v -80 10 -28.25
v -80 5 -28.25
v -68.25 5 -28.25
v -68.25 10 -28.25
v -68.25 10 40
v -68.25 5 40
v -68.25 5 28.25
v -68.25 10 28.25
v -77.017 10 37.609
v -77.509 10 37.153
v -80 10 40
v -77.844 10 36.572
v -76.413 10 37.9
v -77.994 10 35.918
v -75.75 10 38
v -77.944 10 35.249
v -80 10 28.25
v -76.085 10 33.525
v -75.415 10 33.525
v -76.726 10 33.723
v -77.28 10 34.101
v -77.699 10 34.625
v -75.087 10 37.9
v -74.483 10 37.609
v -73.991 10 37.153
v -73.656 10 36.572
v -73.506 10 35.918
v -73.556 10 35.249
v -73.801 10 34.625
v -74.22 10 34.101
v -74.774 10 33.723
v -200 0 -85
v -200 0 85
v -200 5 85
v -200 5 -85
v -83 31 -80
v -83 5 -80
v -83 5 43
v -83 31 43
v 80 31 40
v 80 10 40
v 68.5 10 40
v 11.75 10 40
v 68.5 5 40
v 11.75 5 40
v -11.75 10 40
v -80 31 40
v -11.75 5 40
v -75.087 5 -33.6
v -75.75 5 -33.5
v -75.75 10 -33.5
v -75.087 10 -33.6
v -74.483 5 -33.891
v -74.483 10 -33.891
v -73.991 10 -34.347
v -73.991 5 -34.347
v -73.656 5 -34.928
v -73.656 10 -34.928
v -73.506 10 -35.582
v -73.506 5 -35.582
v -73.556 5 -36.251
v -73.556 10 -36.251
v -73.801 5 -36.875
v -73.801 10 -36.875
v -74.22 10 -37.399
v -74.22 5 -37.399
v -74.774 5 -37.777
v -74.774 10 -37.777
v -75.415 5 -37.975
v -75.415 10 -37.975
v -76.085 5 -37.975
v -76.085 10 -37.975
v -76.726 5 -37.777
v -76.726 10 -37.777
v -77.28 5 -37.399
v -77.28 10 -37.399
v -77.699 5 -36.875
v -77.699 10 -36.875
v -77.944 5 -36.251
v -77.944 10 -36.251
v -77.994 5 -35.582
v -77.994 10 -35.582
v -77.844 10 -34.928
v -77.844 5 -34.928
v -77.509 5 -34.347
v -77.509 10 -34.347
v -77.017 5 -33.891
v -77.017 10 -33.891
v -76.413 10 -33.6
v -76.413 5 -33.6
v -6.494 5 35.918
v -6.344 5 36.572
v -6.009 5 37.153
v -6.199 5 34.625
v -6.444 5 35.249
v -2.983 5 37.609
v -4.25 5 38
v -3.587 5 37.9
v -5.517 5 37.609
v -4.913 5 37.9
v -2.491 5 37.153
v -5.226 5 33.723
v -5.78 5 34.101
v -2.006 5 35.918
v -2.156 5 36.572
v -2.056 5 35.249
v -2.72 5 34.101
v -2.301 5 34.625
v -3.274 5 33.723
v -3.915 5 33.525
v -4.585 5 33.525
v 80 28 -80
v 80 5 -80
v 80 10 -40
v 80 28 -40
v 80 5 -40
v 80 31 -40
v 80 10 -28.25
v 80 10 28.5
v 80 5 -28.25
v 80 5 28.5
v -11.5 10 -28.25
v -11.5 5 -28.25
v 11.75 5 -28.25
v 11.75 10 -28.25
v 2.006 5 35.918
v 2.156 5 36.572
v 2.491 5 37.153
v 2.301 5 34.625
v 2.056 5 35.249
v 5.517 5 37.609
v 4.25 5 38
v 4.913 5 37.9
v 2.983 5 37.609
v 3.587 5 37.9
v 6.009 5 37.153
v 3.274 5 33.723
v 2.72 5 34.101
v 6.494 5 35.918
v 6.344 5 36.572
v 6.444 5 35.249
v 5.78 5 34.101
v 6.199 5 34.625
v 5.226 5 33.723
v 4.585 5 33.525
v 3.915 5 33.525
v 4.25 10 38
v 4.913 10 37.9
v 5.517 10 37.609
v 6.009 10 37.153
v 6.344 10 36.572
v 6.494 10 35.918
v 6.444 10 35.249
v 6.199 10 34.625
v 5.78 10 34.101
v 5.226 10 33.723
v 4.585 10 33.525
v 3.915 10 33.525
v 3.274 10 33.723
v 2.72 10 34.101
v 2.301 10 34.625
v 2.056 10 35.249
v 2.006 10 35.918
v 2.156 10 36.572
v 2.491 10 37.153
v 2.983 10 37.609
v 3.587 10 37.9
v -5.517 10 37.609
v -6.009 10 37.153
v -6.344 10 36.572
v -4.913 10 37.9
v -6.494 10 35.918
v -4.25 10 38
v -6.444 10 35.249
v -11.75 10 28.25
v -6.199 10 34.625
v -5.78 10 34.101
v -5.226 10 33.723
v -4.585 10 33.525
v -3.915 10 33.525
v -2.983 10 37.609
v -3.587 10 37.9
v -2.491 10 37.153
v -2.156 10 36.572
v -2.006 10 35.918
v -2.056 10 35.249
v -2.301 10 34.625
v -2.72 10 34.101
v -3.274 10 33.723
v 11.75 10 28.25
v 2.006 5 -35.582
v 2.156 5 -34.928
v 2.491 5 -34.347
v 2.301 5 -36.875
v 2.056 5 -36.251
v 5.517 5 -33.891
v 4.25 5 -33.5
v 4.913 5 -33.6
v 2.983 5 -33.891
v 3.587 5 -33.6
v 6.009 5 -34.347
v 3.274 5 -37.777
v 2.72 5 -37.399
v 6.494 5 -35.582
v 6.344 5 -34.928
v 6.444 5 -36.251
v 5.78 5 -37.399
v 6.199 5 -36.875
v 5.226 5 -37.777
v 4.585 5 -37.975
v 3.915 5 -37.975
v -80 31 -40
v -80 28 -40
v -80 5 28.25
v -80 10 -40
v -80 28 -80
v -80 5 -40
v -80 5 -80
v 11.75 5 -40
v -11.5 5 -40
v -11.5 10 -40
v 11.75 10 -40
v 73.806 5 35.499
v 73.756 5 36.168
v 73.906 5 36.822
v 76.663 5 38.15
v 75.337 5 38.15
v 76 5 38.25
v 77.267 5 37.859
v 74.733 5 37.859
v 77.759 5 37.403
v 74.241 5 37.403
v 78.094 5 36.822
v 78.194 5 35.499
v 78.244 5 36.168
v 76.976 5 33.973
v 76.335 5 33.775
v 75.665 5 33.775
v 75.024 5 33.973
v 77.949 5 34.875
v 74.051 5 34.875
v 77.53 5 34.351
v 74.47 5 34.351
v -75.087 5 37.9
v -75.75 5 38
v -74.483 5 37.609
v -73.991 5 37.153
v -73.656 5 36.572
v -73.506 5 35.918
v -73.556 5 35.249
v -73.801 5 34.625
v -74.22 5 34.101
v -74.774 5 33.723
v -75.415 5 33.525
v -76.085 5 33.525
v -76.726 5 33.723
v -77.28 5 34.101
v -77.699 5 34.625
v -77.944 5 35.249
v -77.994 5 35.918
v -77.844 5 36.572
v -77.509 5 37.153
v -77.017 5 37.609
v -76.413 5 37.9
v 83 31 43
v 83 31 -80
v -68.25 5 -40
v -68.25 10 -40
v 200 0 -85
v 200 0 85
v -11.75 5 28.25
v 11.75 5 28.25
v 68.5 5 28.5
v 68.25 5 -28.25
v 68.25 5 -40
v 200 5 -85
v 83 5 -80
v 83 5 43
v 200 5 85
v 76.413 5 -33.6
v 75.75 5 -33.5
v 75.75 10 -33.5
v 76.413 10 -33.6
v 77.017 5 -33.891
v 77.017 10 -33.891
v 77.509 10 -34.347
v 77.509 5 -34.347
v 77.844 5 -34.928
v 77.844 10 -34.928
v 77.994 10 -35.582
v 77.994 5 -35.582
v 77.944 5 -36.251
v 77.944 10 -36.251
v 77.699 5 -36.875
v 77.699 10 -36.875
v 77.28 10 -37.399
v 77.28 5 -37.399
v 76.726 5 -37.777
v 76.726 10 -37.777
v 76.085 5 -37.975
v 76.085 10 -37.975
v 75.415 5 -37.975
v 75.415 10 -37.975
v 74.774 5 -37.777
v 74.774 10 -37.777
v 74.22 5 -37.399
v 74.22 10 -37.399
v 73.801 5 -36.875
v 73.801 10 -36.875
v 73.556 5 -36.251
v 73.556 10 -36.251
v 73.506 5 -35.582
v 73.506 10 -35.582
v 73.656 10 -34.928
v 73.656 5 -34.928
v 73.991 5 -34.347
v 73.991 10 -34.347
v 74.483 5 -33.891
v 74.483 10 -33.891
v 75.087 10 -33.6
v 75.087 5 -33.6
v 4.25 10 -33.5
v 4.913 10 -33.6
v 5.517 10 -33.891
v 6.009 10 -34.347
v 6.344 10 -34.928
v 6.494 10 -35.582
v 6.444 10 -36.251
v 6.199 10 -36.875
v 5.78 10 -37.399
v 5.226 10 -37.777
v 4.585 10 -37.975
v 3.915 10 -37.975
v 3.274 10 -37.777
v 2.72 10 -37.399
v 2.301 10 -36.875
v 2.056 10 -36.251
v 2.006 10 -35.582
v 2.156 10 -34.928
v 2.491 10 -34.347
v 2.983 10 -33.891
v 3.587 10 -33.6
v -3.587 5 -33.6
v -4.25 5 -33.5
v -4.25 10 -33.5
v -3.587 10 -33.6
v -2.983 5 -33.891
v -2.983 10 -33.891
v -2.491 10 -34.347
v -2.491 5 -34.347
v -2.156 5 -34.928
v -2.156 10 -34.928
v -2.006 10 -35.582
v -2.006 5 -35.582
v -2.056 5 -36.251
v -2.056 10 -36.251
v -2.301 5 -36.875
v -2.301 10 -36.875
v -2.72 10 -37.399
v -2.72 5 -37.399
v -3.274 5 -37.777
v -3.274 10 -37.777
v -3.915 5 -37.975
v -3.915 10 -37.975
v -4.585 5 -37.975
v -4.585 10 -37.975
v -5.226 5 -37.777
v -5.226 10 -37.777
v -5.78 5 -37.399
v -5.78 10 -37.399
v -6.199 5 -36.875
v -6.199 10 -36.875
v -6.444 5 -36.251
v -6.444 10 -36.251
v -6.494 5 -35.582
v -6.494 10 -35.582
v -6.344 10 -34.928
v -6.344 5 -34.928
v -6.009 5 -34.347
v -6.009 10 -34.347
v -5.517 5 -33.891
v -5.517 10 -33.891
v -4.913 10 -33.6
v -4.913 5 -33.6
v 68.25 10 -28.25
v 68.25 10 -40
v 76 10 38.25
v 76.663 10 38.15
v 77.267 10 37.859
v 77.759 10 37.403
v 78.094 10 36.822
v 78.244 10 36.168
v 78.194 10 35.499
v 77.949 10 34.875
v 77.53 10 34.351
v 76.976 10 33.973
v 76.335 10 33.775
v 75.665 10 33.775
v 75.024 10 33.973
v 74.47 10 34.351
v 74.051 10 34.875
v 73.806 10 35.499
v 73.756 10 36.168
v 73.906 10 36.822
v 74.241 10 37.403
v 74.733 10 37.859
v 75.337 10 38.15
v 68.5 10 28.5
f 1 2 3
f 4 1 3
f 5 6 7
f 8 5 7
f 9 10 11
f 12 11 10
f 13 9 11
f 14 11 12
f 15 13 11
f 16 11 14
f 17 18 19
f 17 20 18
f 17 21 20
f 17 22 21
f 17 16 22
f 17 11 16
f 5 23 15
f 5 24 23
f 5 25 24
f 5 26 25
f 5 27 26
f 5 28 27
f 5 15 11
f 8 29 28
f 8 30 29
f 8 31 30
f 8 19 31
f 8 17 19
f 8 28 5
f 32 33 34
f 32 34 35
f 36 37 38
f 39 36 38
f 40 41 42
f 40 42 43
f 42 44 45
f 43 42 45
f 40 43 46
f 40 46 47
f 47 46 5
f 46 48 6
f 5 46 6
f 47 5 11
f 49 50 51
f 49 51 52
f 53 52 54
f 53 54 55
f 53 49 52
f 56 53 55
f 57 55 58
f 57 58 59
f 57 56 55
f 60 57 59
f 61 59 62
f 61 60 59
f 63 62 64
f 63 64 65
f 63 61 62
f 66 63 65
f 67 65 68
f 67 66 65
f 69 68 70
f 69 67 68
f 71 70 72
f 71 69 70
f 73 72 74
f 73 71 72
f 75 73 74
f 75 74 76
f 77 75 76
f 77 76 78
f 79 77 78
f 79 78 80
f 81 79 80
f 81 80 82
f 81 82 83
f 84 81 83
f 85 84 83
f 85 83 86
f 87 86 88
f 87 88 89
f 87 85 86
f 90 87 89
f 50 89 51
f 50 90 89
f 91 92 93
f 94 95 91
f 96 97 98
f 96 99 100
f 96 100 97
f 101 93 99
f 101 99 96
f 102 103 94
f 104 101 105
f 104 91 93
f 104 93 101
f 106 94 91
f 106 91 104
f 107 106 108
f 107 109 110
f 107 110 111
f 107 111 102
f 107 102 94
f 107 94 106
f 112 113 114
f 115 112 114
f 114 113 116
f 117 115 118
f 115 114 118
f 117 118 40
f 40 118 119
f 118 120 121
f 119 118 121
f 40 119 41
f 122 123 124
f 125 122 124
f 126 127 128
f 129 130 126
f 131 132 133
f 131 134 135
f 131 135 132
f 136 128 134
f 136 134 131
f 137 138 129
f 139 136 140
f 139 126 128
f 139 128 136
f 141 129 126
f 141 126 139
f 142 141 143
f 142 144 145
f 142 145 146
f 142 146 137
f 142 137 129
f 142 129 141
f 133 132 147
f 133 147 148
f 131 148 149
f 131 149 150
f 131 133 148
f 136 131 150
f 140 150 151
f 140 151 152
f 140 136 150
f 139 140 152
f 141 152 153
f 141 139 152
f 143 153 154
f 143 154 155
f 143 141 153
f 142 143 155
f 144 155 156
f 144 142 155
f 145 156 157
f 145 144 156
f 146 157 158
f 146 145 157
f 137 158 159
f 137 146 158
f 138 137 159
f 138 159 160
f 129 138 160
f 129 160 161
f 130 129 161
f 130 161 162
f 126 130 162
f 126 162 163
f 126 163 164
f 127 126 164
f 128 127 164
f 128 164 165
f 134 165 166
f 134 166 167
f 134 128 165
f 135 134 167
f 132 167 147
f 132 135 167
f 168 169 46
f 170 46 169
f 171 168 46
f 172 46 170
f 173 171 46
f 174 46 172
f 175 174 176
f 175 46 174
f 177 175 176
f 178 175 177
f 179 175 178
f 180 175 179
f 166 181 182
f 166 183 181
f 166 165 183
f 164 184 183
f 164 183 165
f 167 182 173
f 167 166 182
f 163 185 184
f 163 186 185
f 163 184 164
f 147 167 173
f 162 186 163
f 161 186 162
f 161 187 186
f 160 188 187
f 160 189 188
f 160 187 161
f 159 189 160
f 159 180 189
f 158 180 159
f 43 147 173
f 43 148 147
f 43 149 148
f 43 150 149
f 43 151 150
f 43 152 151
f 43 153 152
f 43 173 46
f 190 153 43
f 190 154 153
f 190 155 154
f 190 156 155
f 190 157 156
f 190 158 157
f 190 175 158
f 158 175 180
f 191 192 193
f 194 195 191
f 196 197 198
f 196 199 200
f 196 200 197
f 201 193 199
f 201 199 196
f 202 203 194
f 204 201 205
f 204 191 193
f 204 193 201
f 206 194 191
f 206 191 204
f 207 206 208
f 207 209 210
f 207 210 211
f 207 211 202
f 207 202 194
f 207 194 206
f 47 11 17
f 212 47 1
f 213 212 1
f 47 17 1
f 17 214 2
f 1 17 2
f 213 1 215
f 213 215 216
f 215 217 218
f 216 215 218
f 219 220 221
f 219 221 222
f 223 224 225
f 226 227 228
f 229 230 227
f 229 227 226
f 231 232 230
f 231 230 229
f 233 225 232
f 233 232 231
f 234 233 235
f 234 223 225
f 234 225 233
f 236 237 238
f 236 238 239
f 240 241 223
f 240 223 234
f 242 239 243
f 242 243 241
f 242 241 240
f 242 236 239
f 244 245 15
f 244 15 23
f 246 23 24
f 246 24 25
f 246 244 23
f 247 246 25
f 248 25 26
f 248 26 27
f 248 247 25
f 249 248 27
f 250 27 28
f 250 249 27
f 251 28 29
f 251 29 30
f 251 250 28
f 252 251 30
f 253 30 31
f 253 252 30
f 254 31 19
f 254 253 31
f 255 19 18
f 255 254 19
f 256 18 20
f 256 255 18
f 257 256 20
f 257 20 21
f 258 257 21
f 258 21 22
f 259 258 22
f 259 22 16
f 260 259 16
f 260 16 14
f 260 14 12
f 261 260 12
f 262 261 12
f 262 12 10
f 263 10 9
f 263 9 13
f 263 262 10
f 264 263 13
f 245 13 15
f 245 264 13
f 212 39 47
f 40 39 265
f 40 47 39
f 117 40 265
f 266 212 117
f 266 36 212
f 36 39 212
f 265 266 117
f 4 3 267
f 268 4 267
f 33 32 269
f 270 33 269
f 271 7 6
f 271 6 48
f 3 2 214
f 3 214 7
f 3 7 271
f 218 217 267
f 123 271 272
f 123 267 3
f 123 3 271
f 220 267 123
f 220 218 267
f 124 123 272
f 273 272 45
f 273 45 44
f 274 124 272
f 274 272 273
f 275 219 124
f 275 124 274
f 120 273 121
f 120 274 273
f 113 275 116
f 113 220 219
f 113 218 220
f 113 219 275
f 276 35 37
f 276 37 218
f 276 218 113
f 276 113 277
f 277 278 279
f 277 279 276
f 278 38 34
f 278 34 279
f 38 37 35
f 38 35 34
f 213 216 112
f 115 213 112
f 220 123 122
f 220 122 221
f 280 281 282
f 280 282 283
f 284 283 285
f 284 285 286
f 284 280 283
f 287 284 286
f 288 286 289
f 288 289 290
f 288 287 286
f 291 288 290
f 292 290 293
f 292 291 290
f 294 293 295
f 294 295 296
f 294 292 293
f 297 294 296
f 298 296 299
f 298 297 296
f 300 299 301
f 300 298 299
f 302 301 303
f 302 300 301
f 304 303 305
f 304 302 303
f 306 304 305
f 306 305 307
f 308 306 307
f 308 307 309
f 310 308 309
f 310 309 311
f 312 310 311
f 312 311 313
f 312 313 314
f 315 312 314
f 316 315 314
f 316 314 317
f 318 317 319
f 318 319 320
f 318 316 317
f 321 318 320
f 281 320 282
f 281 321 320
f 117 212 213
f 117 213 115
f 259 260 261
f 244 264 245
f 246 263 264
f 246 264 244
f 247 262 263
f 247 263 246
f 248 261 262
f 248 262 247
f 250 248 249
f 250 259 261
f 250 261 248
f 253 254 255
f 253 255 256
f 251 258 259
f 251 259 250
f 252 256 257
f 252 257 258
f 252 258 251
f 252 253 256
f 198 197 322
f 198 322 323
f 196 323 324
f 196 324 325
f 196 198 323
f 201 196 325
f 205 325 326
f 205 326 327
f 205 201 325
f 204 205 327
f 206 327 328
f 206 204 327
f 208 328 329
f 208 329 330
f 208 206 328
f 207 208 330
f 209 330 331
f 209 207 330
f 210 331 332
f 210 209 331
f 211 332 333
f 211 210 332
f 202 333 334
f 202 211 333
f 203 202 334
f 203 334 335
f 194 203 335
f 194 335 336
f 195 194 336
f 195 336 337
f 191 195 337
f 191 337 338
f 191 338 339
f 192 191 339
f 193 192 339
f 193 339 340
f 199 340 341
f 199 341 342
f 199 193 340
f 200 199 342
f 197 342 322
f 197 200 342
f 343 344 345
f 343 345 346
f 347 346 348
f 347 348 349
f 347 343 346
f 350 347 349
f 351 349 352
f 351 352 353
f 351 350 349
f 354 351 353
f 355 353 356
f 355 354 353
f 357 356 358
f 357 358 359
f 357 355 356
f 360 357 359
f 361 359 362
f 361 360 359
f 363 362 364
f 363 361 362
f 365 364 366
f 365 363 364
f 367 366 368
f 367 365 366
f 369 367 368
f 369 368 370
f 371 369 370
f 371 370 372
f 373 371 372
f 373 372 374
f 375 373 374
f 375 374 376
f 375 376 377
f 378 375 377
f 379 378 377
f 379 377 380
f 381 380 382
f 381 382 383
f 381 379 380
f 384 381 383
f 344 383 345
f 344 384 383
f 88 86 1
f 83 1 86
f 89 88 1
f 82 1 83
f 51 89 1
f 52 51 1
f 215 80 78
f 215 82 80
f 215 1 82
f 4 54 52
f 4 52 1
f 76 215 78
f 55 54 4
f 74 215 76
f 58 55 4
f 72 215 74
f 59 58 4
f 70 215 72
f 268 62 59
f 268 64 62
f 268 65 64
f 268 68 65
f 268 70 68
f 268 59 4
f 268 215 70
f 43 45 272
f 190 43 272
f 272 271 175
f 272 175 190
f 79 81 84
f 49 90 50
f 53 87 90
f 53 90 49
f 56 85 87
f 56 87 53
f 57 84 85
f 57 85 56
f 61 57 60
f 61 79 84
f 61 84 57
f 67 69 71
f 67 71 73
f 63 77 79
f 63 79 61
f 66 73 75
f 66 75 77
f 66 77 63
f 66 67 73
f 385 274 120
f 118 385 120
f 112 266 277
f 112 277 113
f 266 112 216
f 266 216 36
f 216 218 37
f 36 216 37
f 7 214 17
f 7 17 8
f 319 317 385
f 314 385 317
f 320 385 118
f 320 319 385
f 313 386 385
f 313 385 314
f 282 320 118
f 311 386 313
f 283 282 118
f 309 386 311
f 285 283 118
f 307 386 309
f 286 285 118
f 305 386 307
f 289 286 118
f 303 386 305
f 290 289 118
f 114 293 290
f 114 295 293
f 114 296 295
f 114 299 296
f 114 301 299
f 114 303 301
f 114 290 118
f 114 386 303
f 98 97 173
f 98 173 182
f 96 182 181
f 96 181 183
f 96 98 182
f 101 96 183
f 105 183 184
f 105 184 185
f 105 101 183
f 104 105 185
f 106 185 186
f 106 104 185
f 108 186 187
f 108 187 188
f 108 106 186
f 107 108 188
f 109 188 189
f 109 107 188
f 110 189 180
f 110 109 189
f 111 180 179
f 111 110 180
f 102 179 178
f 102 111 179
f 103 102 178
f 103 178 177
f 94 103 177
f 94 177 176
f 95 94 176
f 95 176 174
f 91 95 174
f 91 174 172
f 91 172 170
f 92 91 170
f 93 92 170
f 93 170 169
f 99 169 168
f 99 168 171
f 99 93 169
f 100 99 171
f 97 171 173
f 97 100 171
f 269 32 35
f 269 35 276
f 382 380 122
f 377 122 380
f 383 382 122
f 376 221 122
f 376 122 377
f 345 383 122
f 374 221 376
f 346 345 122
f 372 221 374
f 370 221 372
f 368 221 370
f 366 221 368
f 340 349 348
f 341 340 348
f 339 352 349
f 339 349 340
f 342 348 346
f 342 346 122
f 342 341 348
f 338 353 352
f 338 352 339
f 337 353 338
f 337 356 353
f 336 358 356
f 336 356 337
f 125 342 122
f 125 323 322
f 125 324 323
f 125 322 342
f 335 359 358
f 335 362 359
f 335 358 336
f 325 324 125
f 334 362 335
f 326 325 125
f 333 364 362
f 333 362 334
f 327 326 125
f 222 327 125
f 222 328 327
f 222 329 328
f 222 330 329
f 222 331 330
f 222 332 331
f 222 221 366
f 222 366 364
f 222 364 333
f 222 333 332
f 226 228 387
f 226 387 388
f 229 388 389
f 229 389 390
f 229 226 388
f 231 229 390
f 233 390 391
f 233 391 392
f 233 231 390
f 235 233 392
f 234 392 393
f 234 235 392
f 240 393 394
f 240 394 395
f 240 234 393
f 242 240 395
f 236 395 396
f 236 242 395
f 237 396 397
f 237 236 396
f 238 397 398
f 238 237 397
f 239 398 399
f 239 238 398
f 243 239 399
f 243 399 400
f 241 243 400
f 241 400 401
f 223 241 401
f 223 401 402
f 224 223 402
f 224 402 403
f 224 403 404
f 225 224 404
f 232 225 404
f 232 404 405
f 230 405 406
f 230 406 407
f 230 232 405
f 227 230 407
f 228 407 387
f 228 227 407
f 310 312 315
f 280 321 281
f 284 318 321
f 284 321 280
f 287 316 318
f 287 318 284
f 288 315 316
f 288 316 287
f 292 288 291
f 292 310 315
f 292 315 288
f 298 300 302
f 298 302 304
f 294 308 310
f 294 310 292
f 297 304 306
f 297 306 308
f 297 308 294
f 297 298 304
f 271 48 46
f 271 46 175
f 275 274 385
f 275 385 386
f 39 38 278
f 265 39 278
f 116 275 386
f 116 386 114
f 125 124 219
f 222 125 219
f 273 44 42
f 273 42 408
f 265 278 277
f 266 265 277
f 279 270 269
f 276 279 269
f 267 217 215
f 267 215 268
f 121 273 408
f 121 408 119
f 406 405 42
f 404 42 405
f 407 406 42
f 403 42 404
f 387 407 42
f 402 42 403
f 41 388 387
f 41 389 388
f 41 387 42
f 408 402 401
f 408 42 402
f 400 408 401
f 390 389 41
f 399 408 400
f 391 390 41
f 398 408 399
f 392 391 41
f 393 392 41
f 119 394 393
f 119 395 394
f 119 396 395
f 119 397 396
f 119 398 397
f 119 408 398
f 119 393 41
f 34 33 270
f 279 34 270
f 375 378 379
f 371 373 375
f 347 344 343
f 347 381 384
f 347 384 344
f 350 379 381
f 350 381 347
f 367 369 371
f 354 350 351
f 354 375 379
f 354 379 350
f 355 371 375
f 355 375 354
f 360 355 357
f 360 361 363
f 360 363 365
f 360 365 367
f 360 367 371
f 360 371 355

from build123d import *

# Parameters (mm, degrees)
SKIZZE1_W                       = 400
SKIZZE1_H                       = 170
AUFSATZ_LINEAR_AUSTRAGEN1_DEPTH = 5
SKIZZE3_W                       = 11.75
SKIZZE3_H                       = 11.75
SKIZZE3_R                       = 2.25
SKIZZE3_W_2                     = 11.5
SKIZZE3_H_2                     = 11.5
SKIZZE3_W_3                     = 23.5
SKIZZE3_W_4                     = 23.25
AUFSATZ_LINEAR_AUSTRAGEN6_DEPTH = 5
AUFSATZ_LINEAR_AUSTRAGEN7_DEPTH = 26
SKIZZE6_W                       = 160
SKIZZE6_H                       = 40
AUFSATZ_LINEAR_AUSTRAGEN8_DEPTH = 3


with BuildPart() as part:
    # Skizze1 → Aufsatz-Linear austragen1 (new body)
    with BuildSketch(Plane(origin=(0, 0, 0), x_dir=(1, 0, 0), z_dir=(0, 1, 0))):
        Rectangle(SKIZZE1_W, SKIZZE1_H)
    extrude(amount=AUFSATZ_LINEAR_AUSTRAGEN1_DEPTH)

    # Skizze3 → Aufsatz-Linear austragen6 (add)
    # profile 1 of 6: a face of its own
    with BuildSketch(Plane(origin=(0, 5, 0), x_dir=(1, 0, 0), z_dir=(0, 1, 0))):
        with Locations((74.125, 34.125)):
            Rectangle(SKIZZE3_W, SKIZZE3_H)
        with Locations(Location((75.75, 35.75, 0), (0, 0, 270))):
            Circle(SKIZZE3_R, mode=Mode.SUBTRACT)
    # profile 2 of 6: a face of its own
    with BuildSketch(Plane(origin=(0, 5, 0), x_dir=(1, 0, 0), z_dir=(0, 1, 0))):
        with Locations((-74.125, 34.125)):
            Rectangle(SKIZZE3_W, SKIZZE3_H)
        with Locations(Location((-75.75, 35.75, 0), (0, 0, 270))):
            Circle(SKIZZE3_R, mode=Mode.SUBTRACT)
    # profile 3 of 6: a face of its own
    with BuildSketch(Plane(origin=(0, 5, 0), x_dir=(1, 0, 0), z_dir=(0, 1, 0))):
        with Locations((-74.125, -34.125)):
            Rectangle(SKIZZE3_W, SKIZZE3_H)
        with Locations(Location((-75.75, -35.75, 0), (0, 0, 270))):
            Circle(SKIZZE3_R, mode=Mode.SUBTRACT)
    # profile 4 of 6: a face of its own
    with BuildSketch(Plane(origin=(0, 5, 0), x_dir=(1, 0, 0), z_dir=(0, 1, 0))):
        with Locations((74.25, -34.25)):
            Rectangle(SKIZZE3_W_2, SKIZZE3_H_2)
        with Locations(Location((76, -36, 0), (0, 0, 270))):
            Circle(SKIZZE3_R, mode=Mode.SUBTRACT)
    # profile 5 of 6: a face of its own
    with BuildSketch(Plane(origin=(0, 5, 0), x_dir=(1, 0, 0), z_dir=(0, 1, 0))):
        with Locations((0, -34.125)):
            Rectangle(SKIZZE3_W_3, SKIZZE3_H)
        with Locations(Location((-4.25, -35.75, 0), (0, 0, 270))):
            Circle(SKIZZE3_R, mode=Mode.SUBTRACT)
        with Locations(Location((4.25, -35.75, 0), (0, 0, 270))):
            Circle(SKIZZE3_R, mode=Mode.SUBTRACT)
    # profile 6 of 6: a face of its own
    with BuildSketch(Plane(origin=(0, 5, 0), x_dir=(1, 0, 0), z_dir=(0, 1, 0))):
        with Locations((0.125, 34.125)):
            Rectangle(SKIZZE3_W_4, SKIZZE3_H)
        with Locations(Location((-4.25, 35.75, 0), (0, 0, 270))):
            Circle(SKIZZE3_R, mode=Mode.SUBTRACT)
        with Locations(Location((4.25, 35.75, 0), (0, 0, 270))):
            Circle(SKIZZE3_R, mode=Mode.SUBTRACT)
    extrude(amount=AUFSATZ_LINEAR_AUSTRAGEN6_DEPTH)

    # Skizze4 → Aufsatz-Linear austragen7 (add)
    with BuildSketch(Plane(origin=(0, 5, 0), x_dir=(1, 0, 0), z_dir=(0, 1, 0))):
        Polygon((-83, 80), (-83, -40), (-80, -40), (-80, -28.25), (-80, 28.25), (-80, 40), (-80, 80), align=None)
        Polygon((83, -40), (80, -40), (68.5, -40), (11.75, -40), (-11.75, -40), (-68.25, -40), (-80, -40), (-83, -40), (-83, -43), (83, -43), align=None)
        Polygon((80, -28.5), (80, -40), (83, -40), (83, 80), (80, 80), (80, 40), (80, 28.25), align=None)
    extrude(amount=AUFSATZ_LINEAR_AUSTRAGEN7_DEPTH)

    # Skizze6 → Aufsatz-Linear austragen8 (add)
    with BuildSketch(Plane(origin=(0, 31, 0), x_dir=(1, 0, 0), z_dir=(0, 1, 0))):
        with Locations((0, 60)):
            Rectangle(SKIZZE6_W, SKIZZE6_H)
    extrude(amount=-AUFSATZ_LINEAR_AUSTRAGEN8_DEPTH)


solid = part.part
